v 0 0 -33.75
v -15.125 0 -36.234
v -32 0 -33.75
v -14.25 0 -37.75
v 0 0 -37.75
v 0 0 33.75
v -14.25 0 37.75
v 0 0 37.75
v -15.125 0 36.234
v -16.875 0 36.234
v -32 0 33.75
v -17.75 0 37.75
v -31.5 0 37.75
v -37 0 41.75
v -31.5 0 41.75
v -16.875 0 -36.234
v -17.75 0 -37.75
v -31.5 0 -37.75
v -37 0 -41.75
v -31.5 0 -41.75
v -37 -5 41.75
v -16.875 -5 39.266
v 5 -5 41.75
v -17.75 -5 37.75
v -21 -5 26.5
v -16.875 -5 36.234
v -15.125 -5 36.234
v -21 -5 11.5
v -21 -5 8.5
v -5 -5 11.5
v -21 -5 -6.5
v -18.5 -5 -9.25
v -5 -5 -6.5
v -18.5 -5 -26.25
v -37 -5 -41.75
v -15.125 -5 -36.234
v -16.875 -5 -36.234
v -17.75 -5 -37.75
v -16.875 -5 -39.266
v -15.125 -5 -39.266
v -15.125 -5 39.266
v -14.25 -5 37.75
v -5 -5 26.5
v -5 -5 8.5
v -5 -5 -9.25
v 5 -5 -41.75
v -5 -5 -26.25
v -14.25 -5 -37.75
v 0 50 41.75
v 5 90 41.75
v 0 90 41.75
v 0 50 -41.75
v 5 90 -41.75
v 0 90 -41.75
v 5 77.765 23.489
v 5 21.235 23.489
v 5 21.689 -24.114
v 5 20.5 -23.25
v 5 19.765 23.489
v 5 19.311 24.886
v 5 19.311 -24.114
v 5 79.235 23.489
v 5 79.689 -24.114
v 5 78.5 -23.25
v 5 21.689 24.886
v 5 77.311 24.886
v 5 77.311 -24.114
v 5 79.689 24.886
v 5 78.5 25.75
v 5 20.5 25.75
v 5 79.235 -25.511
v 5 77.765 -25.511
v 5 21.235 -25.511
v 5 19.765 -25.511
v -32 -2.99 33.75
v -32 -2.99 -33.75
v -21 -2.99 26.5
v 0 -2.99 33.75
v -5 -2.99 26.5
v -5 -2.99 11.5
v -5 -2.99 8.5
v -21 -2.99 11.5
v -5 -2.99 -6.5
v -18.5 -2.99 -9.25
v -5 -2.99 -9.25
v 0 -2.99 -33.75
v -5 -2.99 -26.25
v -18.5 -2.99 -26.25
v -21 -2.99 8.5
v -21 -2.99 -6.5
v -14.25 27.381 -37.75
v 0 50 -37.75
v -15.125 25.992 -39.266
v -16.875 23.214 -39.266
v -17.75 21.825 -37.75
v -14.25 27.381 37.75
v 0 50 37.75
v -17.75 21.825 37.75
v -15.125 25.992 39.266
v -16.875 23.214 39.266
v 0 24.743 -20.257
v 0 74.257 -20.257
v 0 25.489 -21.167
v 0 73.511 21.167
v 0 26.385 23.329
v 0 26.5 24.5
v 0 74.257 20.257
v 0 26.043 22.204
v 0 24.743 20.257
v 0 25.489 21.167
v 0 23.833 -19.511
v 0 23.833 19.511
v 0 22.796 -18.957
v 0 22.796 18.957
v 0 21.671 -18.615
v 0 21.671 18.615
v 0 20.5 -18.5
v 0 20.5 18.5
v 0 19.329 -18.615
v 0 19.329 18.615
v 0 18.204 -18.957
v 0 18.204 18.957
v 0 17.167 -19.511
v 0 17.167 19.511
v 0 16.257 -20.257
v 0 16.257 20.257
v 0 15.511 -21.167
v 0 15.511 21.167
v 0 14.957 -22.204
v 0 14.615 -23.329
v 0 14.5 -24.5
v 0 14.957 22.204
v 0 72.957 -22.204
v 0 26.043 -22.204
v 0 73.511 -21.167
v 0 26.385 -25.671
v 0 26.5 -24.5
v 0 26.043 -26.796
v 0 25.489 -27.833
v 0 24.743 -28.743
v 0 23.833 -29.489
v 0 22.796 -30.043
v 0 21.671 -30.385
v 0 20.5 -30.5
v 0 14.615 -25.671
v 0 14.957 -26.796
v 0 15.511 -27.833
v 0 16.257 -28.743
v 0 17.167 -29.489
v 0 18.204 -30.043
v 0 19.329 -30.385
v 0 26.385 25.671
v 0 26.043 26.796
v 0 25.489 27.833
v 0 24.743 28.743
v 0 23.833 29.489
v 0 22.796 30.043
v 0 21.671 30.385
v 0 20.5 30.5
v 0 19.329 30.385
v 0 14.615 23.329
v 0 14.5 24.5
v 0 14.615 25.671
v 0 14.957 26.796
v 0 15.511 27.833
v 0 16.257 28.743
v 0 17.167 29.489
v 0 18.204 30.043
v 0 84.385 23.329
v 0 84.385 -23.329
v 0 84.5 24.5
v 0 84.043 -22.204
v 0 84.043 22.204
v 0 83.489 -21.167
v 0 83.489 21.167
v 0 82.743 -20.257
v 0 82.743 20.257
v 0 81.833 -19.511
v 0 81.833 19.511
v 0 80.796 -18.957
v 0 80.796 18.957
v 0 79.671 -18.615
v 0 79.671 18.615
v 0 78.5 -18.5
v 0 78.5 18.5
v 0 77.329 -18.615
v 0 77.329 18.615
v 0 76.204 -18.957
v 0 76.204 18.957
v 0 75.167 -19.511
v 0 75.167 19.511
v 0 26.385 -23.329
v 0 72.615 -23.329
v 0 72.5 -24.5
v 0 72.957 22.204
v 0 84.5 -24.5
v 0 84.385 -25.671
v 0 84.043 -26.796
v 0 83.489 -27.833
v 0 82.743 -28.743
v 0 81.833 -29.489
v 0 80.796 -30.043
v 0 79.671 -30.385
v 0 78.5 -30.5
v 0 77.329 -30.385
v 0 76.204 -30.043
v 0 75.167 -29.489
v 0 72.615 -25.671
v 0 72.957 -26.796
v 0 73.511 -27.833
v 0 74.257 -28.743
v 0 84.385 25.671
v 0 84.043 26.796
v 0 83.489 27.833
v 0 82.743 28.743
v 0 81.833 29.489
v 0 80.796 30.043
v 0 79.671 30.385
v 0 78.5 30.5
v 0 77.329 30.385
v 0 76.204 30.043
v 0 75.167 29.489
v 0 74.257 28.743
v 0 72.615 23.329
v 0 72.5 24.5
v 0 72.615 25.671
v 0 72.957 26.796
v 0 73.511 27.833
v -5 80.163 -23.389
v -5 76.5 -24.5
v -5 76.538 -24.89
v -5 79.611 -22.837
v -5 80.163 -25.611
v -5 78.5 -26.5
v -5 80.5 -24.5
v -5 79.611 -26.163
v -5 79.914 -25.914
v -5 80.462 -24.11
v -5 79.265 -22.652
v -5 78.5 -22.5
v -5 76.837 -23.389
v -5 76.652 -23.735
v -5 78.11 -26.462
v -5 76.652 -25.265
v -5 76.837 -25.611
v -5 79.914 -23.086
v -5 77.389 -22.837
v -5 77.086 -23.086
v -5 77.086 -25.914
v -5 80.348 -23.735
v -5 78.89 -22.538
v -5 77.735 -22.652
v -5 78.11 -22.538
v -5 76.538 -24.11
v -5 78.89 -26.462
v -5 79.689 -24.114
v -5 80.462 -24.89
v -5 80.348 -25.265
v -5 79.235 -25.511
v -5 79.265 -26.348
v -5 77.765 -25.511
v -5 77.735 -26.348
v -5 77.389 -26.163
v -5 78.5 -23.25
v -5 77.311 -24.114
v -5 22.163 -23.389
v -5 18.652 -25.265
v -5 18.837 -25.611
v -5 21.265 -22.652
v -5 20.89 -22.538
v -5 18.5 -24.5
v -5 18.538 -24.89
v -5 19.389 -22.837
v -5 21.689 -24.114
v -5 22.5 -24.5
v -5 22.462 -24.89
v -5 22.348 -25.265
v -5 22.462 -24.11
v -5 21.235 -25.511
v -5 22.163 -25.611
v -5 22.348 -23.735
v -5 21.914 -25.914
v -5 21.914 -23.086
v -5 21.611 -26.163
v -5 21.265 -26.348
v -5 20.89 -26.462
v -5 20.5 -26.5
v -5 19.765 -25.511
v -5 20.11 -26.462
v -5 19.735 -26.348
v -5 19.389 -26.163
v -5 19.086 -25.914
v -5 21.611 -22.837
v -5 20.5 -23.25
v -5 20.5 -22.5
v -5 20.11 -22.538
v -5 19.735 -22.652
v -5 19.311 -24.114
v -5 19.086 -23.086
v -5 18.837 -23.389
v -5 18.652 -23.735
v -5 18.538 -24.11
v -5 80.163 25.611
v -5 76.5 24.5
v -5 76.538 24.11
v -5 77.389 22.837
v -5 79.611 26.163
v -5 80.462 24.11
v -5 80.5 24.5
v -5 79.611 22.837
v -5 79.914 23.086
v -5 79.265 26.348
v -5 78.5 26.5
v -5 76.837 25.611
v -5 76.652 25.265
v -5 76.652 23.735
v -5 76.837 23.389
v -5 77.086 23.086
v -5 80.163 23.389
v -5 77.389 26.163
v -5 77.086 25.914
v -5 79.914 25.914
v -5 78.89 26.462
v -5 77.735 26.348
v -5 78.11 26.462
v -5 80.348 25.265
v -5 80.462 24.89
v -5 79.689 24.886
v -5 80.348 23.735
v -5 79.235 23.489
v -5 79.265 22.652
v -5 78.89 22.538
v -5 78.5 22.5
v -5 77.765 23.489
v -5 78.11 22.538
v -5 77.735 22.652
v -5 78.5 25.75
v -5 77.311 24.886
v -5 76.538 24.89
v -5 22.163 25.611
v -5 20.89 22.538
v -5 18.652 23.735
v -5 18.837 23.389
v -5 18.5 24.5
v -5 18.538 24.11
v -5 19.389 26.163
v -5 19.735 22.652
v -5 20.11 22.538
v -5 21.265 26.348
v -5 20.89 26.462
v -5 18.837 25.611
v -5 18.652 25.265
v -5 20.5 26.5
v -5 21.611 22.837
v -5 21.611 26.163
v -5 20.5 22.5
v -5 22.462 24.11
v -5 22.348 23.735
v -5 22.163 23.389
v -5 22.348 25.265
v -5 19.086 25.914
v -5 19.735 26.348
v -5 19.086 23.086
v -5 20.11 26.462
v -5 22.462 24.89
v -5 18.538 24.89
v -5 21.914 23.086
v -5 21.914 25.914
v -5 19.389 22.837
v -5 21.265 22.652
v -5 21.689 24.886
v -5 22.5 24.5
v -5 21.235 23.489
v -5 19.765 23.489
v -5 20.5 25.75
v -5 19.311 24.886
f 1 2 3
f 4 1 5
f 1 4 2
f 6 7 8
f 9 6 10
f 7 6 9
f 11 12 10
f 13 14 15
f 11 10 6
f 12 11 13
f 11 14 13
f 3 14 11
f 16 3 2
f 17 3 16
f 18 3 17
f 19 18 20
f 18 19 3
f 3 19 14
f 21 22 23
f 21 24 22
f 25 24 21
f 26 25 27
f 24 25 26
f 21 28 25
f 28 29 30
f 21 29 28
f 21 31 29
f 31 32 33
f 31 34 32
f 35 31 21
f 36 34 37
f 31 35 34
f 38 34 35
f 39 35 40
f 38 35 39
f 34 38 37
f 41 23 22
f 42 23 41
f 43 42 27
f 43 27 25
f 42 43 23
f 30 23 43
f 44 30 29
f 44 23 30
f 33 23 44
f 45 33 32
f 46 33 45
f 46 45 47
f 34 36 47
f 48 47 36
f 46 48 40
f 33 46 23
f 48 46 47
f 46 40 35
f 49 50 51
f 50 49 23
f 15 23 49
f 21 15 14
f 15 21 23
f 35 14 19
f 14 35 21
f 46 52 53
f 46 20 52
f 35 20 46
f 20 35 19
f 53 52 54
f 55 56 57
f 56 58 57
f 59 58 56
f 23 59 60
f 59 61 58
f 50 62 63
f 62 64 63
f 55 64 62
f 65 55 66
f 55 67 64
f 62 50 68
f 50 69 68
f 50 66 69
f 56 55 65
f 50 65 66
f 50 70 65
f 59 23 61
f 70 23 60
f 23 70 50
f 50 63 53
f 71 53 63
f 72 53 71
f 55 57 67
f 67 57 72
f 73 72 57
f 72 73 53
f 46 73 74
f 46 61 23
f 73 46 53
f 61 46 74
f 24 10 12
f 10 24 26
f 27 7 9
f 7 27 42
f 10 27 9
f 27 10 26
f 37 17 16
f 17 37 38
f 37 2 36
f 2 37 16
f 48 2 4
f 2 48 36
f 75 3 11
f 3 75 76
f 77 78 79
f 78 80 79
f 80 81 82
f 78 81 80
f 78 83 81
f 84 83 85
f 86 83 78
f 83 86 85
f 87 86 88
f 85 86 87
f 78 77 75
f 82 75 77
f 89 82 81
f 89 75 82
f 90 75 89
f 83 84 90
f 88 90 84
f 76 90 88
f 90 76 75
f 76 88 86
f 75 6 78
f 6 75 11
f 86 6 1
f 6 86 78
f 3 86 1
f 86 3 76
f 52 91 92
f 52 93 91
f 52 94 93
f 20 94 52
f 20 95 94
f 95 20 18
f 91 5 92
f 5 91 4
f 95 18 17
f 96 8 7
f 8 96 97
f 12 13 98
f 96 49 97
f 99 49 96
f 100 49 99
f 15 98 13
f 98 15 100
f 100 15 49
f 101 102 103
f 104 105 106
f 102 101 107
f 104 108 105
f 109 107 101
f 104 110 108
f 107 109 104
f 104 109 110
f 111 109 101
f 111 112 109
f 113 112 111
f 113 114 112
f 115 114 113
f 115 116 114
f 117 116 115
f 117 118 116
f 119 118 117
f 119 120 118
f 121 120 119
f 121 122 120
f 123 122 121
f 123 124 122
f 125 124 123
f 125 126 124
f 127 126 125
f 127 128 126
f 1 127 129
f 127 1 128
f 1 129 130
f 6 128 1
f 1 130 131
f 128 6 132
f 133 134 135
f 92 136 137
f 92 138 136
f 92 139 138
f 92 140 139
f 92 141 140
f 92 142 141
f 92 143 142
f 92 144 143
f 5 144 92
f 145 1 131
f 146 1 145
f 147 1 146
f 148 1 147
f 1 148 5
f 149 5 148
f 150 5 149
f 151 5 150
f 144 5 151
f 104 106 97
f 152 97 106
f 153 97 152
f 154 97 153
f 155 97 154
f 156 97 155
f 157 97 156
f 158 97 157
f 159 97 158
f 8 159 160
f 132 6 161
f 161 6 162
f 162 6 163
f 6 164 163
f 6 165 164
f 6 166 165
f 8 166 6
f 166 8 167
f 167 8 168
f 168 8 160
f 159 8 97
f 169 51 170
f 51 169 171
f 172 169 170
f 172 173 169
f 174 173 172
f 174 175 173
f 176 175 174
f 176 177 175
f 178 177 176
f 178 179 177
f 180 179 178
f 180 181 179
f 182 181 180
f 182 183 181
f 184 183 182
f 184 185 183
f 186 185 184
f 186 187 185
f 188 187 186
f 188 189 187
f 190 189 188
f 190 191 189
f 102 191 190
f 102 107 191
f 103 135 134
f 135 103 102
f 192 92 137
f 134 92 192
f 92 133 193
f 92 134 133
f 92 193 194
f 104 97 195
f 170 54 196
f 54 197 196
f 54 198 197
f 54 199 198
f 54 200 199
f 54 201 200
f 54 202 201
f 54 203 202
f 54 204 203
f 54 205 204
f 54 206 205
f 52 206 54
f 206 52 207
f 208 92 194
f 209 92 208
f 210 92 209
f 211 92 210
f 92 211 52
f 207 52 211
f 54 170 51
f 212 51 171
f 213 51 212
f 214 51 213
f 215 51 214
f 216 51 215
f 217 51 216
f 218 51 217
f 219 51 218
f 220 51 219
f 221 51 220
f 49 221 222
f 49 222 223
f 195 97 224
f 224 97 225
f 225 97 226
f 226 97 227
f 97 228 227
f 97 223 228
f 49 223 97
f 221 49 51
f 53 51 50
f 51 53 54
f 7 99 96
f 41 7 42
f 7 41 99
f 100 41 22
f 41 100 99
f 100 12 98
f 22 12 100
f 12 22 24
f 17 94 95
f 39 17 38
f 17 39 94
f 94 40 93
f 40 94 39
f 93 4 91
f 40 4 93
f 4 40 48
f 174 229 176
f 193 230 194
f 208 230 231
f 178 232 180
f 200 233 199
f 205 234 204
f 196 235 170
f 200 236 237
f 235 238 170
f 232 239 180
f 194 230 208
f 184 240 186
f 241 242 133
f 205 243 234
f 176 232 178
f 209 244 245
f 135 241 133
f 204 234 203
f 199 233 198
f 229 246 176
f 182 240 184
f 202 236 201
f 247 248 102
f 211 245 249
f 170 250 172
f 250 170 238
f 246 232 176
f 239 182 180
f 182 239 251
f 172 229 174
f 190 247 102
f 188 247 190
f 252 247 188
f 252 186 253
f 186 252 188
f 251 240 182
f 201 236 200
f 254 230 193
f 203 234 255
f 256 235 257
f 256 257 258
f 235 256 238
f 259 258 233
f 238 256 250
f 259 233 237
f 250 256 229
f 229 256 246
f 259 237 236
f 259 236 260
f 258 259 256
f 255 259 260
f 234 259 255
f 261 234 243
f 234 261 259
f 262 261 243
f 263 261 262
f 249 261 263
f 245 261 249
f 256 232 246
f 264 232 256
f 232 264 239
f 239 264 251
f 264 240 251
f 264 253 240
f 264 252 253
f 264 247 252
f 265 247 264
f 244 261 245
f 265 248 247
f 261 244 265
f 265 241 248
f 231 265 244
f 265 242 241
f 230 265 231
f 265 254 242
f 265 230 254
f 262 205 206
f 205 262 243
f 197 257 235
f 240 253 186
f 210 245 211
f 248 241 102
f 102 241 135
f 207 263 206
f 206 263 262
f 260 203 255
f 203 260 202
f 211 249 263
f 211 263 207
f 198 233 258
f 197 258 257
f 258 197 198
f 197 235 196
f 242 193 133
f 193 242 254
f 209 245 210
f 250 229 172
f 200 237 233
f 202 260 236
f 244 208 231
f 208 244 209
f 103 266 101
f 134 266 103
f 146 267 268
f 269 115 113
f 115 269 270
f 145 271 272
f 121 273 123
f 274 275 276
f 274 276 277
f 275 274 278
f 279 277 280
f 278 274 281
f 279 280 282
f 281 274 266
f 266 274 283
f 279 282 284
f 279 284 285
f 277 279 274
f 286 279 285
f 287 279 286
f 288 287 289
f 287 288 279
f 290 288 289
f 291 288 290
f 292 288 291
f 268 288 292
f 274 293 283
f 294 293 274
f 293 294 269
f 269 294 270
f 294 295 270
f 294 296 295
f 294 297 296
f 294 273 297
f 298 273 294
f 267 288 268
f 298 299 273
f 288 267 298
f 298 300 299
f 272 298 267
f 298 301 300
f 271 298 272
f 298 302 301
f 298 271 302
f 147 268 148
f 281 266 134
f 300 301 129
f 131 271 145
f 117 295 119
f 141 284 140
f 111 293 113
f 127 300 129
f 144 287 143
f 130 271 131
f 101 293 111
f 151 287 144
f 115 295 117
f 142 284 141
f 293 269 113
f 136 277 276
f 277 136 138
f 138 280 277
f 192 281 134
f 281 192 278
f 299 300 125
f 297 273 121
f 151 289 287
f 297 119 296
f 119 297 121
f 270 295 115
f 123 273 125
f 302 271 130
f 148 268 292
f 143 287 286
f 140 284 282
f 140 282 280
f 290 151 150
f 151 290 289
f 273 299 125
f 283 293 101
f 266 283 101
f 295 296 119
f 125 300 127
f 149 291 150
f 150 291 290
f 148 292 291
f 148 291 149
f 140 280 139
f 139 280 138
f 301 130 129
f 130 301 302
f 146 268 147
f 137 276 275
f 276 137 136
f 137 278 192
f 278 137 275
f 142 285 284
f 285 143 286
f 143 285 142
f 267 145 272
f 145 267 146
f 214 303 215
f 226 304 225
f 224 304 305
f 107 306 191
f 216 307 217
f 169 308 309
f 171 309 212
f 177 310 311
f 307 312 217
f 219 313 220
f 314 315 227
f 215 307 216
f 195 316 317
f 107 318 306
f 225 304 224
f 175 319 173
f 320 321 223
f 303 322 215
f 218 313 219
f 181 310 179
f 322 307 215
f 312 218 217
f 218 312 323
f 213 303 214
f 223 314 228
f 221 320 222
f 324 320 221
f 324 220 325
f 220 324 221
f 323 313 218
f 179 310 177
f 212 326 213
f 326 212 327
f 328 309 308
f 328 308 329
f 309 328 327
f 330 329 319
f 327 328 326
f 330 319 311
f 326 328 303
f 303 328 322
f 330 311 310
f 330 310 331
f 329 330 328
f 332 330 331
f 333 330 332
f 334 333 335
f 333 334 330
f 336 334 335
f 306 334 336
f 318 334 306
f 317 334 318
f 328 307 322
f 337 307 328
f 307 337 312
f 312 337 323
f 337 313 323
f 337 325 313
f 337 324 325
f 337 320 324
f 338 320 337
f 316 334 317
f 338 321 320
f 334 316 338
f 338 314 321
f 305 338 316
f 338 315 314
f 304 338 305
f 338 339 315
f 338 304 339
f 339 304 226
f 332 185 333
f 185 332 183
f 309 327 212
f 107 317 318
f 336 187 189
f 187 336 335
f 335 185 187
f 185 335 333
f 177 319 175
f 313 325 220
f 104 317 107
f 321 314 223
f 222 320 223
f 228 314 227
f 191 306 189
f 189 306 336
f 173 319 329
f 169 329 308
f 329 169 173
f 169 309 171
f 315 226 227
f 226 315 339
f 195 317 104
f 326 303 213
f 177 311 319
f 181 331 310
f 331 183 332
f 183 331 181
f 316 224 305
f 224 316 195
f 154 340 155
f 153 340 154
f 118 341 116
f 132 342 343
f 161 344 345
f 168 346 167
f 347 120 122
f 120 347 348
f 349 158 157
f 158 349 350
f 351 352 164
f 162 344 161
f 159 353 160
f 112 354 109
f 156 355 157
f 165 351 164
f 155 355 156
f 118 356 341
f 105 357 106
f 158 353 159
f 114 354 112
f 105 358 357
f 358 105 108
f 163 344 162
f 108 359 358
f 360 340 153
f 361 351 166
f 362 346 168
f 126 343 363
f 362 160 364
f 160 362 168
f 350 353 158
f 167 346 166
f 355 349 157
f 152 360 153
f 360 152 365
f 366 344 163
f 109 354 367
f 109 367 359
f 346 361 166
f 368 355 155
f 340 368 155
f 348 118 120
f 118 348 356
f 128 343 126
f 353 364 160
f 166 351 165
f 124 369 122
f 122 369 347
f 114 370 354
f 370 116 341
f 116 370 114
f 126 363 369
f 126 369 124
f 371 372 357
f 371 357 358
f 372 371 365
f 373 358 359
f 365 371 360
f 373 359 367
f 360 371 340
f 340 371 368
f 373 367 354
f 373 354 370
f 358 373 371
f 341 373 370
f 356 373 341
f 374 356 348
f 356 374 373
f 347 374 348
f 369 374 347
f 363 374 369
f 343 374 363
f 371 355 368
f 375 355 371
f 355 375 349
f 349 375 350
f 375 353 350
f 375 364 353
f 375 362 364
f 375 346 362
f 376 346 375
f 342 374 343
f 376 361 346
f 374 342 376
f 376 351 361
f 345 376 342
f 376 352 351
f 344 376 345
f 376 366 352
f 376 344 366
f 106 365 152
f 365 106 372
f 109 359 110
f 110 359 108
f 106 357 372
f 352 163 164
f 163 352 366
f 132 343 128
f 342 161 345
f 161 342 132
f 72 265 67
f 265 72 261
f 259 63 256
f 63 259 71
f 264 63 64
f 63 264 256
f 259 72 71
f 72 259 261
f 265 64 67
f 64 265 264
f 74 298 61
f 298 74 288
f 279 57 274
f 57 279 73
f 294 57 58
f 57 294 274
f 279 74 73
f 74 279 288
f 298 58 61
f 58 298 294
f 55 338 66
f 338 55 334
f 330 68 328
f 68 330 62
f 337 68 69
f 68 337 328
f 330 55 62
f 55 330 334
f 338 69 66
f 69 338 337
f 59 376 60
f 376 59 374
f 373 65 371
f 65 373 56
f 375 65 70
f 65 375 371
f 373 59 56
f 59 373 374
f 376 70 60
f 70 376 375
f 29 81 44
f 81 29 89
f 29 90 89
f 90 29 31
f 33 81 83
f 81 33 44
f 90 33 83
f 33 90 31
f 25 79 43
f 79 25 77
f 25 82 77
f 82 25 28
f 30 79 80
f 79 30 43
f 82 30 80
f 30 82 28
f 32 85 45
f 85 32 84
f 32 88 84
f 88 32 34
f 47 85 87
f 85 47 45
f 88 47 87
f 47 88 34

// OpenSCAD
// file: blank.scad
include <common.scad>

module Blank(front_thickness=5, recess_size=[segment_width - 10, segment_height - 16], recess_depth=3)
{
  color("red")
  {
    rotate([90, 0, 0])
    {
      difference()
      {
        linear_extrude(front_thickness)
        {
          FrontProjection();
        }

        translate([0, 0, -0.01])
        {
          linear_extrude(recess_depth)
          {
            square(recess_size, center=true);
          }
        }
      }
    }
  }
}

Blank();
// file: common.scad
segment_width = 42;
segment_height = 83.5;

mounting_hole_centres = 75.5;
mounting_hole_diameter = 3.5;

module MountingHolesProjection()
{
  for(y = [-mounting_hole_centres/2, mounting_hole_centres/2])
  {
    translate([0, y])
    {
      circle(d=mounting_hole_diameter);
    }
  }
}

module FrontProjection()
{
  difference()
  {
    square([segment_width, segment_height], center=true);
    MountingHolesProjection();
  }
}

module Standoff(lower_diameter, upper_diameter, height)
{
  hull()
  {
    translate([0, 0, -1])
    {
      cylinder(d=lower_diameter, h=1, $fn=32);
    }

    translate([0, 0, height - 1])
    {
      cylinder(d=upper_diameter, h=1, $fn=32);
    }
  }
}
// file: blank_with_mounting_plate.scad
include <common.scad>
use <blank.scad>

module BlankWithMountingPlate(front_thickness=5, plate_thickness=5, plate_depth=120, recess_size=[segment_width - 10, segment_height - 16], recess_depth=3, support_thickness=5, front_support_length=segment_width*0.75, panel_support_length=50)
{
  a = [-(segment_width / 2) + plate_thickness, 0, 0];

  difference()
  {
    union()
    {
      translate(a)
      {
        Blank(front_thickness, recess_size, recess_depth);
      }

      color("green")
      {
        translate([plate_thickness / 2, 0, 0])
        {
          rotate([-90, 0, 0])
          {
            linear_extrude(plate_depth)
            {
              square([plate_thickness, segment_height], center=true);
            }
          }
        }
      }

      color("blue")
      {
        dz = (segment_height / 2);
        for(z = [-dz, dz - support_thickness])
        {
          translate([0, 0, z])
          {
            hull()
            {
              cube([plate_thickness, panel_support_length, support_thickness]);

              rotate([0, 0, 180])
                cube([front_support_length, front_thickness, support_thickness]);
            }
          }
        }
      }
    }

    translate(a)
    {
      rotate([90, 0, 0])
      {
        linear_extrude(100, center=true)
        {
          MountingHolesProjection();
        }
      }
    }
  }
}

BlankWithMountingPlate();
// main file
use <blank_with_mounting_plate.scad>

board_size = [56, 85];
front_panel_recess = 3;

module PlaceMountingHoles()
{
  translate([-board_size[0]/2, -front_panel_recess])
  {
    translate([3.5, board_size[1] - 3.5])
    {
      for(x = [0, 49])
      {
        for(y = [0, -58])
        {
          translate([x, y])
          {
            children();
          }
        }
      }
    }
  }
}

module Segment()
{
  board_offset = 5;

  difference()
  {
    union()
    {
      BlankWithMountingPlate(plate_depth=90, recess_depth=front_panel_recess, support_thickness=4, panel_support_length=50);

      /* Board standoffs */
      color("cyan")
      {
        rotate([0, -90, 0])
        {
          PlaceMountingHoles()
          {
            Standoff(12, 4, board_offset);
          }
        }
      }
    }

    /* Board mounting holes */
    rotate([0, -90, 0])
    {
      PlaceMountingHoles()
      {
        cylinder(d=2.5, h=50, center=true);
      }
    }

    /* Port cutouts */
    translate([-board_offset, 0, 0])
    {
      rotate([0, -90, 0])
      {
        translate([-board_size[0] / 2, 0, 0])
        {
          /* Ethernet */
          translate([10.25, 0, 13.5 / 2])
          {
            cube([17, 20, 13.5], center=true);
          }

          /* USB */
          for(x = [29, 47])
          {
            translate([x, 0, 16 / 2])
            {
              cube([15, 20, 16], center=true);
            }
          }
        }
      }
    }
  }
}

Segment();
